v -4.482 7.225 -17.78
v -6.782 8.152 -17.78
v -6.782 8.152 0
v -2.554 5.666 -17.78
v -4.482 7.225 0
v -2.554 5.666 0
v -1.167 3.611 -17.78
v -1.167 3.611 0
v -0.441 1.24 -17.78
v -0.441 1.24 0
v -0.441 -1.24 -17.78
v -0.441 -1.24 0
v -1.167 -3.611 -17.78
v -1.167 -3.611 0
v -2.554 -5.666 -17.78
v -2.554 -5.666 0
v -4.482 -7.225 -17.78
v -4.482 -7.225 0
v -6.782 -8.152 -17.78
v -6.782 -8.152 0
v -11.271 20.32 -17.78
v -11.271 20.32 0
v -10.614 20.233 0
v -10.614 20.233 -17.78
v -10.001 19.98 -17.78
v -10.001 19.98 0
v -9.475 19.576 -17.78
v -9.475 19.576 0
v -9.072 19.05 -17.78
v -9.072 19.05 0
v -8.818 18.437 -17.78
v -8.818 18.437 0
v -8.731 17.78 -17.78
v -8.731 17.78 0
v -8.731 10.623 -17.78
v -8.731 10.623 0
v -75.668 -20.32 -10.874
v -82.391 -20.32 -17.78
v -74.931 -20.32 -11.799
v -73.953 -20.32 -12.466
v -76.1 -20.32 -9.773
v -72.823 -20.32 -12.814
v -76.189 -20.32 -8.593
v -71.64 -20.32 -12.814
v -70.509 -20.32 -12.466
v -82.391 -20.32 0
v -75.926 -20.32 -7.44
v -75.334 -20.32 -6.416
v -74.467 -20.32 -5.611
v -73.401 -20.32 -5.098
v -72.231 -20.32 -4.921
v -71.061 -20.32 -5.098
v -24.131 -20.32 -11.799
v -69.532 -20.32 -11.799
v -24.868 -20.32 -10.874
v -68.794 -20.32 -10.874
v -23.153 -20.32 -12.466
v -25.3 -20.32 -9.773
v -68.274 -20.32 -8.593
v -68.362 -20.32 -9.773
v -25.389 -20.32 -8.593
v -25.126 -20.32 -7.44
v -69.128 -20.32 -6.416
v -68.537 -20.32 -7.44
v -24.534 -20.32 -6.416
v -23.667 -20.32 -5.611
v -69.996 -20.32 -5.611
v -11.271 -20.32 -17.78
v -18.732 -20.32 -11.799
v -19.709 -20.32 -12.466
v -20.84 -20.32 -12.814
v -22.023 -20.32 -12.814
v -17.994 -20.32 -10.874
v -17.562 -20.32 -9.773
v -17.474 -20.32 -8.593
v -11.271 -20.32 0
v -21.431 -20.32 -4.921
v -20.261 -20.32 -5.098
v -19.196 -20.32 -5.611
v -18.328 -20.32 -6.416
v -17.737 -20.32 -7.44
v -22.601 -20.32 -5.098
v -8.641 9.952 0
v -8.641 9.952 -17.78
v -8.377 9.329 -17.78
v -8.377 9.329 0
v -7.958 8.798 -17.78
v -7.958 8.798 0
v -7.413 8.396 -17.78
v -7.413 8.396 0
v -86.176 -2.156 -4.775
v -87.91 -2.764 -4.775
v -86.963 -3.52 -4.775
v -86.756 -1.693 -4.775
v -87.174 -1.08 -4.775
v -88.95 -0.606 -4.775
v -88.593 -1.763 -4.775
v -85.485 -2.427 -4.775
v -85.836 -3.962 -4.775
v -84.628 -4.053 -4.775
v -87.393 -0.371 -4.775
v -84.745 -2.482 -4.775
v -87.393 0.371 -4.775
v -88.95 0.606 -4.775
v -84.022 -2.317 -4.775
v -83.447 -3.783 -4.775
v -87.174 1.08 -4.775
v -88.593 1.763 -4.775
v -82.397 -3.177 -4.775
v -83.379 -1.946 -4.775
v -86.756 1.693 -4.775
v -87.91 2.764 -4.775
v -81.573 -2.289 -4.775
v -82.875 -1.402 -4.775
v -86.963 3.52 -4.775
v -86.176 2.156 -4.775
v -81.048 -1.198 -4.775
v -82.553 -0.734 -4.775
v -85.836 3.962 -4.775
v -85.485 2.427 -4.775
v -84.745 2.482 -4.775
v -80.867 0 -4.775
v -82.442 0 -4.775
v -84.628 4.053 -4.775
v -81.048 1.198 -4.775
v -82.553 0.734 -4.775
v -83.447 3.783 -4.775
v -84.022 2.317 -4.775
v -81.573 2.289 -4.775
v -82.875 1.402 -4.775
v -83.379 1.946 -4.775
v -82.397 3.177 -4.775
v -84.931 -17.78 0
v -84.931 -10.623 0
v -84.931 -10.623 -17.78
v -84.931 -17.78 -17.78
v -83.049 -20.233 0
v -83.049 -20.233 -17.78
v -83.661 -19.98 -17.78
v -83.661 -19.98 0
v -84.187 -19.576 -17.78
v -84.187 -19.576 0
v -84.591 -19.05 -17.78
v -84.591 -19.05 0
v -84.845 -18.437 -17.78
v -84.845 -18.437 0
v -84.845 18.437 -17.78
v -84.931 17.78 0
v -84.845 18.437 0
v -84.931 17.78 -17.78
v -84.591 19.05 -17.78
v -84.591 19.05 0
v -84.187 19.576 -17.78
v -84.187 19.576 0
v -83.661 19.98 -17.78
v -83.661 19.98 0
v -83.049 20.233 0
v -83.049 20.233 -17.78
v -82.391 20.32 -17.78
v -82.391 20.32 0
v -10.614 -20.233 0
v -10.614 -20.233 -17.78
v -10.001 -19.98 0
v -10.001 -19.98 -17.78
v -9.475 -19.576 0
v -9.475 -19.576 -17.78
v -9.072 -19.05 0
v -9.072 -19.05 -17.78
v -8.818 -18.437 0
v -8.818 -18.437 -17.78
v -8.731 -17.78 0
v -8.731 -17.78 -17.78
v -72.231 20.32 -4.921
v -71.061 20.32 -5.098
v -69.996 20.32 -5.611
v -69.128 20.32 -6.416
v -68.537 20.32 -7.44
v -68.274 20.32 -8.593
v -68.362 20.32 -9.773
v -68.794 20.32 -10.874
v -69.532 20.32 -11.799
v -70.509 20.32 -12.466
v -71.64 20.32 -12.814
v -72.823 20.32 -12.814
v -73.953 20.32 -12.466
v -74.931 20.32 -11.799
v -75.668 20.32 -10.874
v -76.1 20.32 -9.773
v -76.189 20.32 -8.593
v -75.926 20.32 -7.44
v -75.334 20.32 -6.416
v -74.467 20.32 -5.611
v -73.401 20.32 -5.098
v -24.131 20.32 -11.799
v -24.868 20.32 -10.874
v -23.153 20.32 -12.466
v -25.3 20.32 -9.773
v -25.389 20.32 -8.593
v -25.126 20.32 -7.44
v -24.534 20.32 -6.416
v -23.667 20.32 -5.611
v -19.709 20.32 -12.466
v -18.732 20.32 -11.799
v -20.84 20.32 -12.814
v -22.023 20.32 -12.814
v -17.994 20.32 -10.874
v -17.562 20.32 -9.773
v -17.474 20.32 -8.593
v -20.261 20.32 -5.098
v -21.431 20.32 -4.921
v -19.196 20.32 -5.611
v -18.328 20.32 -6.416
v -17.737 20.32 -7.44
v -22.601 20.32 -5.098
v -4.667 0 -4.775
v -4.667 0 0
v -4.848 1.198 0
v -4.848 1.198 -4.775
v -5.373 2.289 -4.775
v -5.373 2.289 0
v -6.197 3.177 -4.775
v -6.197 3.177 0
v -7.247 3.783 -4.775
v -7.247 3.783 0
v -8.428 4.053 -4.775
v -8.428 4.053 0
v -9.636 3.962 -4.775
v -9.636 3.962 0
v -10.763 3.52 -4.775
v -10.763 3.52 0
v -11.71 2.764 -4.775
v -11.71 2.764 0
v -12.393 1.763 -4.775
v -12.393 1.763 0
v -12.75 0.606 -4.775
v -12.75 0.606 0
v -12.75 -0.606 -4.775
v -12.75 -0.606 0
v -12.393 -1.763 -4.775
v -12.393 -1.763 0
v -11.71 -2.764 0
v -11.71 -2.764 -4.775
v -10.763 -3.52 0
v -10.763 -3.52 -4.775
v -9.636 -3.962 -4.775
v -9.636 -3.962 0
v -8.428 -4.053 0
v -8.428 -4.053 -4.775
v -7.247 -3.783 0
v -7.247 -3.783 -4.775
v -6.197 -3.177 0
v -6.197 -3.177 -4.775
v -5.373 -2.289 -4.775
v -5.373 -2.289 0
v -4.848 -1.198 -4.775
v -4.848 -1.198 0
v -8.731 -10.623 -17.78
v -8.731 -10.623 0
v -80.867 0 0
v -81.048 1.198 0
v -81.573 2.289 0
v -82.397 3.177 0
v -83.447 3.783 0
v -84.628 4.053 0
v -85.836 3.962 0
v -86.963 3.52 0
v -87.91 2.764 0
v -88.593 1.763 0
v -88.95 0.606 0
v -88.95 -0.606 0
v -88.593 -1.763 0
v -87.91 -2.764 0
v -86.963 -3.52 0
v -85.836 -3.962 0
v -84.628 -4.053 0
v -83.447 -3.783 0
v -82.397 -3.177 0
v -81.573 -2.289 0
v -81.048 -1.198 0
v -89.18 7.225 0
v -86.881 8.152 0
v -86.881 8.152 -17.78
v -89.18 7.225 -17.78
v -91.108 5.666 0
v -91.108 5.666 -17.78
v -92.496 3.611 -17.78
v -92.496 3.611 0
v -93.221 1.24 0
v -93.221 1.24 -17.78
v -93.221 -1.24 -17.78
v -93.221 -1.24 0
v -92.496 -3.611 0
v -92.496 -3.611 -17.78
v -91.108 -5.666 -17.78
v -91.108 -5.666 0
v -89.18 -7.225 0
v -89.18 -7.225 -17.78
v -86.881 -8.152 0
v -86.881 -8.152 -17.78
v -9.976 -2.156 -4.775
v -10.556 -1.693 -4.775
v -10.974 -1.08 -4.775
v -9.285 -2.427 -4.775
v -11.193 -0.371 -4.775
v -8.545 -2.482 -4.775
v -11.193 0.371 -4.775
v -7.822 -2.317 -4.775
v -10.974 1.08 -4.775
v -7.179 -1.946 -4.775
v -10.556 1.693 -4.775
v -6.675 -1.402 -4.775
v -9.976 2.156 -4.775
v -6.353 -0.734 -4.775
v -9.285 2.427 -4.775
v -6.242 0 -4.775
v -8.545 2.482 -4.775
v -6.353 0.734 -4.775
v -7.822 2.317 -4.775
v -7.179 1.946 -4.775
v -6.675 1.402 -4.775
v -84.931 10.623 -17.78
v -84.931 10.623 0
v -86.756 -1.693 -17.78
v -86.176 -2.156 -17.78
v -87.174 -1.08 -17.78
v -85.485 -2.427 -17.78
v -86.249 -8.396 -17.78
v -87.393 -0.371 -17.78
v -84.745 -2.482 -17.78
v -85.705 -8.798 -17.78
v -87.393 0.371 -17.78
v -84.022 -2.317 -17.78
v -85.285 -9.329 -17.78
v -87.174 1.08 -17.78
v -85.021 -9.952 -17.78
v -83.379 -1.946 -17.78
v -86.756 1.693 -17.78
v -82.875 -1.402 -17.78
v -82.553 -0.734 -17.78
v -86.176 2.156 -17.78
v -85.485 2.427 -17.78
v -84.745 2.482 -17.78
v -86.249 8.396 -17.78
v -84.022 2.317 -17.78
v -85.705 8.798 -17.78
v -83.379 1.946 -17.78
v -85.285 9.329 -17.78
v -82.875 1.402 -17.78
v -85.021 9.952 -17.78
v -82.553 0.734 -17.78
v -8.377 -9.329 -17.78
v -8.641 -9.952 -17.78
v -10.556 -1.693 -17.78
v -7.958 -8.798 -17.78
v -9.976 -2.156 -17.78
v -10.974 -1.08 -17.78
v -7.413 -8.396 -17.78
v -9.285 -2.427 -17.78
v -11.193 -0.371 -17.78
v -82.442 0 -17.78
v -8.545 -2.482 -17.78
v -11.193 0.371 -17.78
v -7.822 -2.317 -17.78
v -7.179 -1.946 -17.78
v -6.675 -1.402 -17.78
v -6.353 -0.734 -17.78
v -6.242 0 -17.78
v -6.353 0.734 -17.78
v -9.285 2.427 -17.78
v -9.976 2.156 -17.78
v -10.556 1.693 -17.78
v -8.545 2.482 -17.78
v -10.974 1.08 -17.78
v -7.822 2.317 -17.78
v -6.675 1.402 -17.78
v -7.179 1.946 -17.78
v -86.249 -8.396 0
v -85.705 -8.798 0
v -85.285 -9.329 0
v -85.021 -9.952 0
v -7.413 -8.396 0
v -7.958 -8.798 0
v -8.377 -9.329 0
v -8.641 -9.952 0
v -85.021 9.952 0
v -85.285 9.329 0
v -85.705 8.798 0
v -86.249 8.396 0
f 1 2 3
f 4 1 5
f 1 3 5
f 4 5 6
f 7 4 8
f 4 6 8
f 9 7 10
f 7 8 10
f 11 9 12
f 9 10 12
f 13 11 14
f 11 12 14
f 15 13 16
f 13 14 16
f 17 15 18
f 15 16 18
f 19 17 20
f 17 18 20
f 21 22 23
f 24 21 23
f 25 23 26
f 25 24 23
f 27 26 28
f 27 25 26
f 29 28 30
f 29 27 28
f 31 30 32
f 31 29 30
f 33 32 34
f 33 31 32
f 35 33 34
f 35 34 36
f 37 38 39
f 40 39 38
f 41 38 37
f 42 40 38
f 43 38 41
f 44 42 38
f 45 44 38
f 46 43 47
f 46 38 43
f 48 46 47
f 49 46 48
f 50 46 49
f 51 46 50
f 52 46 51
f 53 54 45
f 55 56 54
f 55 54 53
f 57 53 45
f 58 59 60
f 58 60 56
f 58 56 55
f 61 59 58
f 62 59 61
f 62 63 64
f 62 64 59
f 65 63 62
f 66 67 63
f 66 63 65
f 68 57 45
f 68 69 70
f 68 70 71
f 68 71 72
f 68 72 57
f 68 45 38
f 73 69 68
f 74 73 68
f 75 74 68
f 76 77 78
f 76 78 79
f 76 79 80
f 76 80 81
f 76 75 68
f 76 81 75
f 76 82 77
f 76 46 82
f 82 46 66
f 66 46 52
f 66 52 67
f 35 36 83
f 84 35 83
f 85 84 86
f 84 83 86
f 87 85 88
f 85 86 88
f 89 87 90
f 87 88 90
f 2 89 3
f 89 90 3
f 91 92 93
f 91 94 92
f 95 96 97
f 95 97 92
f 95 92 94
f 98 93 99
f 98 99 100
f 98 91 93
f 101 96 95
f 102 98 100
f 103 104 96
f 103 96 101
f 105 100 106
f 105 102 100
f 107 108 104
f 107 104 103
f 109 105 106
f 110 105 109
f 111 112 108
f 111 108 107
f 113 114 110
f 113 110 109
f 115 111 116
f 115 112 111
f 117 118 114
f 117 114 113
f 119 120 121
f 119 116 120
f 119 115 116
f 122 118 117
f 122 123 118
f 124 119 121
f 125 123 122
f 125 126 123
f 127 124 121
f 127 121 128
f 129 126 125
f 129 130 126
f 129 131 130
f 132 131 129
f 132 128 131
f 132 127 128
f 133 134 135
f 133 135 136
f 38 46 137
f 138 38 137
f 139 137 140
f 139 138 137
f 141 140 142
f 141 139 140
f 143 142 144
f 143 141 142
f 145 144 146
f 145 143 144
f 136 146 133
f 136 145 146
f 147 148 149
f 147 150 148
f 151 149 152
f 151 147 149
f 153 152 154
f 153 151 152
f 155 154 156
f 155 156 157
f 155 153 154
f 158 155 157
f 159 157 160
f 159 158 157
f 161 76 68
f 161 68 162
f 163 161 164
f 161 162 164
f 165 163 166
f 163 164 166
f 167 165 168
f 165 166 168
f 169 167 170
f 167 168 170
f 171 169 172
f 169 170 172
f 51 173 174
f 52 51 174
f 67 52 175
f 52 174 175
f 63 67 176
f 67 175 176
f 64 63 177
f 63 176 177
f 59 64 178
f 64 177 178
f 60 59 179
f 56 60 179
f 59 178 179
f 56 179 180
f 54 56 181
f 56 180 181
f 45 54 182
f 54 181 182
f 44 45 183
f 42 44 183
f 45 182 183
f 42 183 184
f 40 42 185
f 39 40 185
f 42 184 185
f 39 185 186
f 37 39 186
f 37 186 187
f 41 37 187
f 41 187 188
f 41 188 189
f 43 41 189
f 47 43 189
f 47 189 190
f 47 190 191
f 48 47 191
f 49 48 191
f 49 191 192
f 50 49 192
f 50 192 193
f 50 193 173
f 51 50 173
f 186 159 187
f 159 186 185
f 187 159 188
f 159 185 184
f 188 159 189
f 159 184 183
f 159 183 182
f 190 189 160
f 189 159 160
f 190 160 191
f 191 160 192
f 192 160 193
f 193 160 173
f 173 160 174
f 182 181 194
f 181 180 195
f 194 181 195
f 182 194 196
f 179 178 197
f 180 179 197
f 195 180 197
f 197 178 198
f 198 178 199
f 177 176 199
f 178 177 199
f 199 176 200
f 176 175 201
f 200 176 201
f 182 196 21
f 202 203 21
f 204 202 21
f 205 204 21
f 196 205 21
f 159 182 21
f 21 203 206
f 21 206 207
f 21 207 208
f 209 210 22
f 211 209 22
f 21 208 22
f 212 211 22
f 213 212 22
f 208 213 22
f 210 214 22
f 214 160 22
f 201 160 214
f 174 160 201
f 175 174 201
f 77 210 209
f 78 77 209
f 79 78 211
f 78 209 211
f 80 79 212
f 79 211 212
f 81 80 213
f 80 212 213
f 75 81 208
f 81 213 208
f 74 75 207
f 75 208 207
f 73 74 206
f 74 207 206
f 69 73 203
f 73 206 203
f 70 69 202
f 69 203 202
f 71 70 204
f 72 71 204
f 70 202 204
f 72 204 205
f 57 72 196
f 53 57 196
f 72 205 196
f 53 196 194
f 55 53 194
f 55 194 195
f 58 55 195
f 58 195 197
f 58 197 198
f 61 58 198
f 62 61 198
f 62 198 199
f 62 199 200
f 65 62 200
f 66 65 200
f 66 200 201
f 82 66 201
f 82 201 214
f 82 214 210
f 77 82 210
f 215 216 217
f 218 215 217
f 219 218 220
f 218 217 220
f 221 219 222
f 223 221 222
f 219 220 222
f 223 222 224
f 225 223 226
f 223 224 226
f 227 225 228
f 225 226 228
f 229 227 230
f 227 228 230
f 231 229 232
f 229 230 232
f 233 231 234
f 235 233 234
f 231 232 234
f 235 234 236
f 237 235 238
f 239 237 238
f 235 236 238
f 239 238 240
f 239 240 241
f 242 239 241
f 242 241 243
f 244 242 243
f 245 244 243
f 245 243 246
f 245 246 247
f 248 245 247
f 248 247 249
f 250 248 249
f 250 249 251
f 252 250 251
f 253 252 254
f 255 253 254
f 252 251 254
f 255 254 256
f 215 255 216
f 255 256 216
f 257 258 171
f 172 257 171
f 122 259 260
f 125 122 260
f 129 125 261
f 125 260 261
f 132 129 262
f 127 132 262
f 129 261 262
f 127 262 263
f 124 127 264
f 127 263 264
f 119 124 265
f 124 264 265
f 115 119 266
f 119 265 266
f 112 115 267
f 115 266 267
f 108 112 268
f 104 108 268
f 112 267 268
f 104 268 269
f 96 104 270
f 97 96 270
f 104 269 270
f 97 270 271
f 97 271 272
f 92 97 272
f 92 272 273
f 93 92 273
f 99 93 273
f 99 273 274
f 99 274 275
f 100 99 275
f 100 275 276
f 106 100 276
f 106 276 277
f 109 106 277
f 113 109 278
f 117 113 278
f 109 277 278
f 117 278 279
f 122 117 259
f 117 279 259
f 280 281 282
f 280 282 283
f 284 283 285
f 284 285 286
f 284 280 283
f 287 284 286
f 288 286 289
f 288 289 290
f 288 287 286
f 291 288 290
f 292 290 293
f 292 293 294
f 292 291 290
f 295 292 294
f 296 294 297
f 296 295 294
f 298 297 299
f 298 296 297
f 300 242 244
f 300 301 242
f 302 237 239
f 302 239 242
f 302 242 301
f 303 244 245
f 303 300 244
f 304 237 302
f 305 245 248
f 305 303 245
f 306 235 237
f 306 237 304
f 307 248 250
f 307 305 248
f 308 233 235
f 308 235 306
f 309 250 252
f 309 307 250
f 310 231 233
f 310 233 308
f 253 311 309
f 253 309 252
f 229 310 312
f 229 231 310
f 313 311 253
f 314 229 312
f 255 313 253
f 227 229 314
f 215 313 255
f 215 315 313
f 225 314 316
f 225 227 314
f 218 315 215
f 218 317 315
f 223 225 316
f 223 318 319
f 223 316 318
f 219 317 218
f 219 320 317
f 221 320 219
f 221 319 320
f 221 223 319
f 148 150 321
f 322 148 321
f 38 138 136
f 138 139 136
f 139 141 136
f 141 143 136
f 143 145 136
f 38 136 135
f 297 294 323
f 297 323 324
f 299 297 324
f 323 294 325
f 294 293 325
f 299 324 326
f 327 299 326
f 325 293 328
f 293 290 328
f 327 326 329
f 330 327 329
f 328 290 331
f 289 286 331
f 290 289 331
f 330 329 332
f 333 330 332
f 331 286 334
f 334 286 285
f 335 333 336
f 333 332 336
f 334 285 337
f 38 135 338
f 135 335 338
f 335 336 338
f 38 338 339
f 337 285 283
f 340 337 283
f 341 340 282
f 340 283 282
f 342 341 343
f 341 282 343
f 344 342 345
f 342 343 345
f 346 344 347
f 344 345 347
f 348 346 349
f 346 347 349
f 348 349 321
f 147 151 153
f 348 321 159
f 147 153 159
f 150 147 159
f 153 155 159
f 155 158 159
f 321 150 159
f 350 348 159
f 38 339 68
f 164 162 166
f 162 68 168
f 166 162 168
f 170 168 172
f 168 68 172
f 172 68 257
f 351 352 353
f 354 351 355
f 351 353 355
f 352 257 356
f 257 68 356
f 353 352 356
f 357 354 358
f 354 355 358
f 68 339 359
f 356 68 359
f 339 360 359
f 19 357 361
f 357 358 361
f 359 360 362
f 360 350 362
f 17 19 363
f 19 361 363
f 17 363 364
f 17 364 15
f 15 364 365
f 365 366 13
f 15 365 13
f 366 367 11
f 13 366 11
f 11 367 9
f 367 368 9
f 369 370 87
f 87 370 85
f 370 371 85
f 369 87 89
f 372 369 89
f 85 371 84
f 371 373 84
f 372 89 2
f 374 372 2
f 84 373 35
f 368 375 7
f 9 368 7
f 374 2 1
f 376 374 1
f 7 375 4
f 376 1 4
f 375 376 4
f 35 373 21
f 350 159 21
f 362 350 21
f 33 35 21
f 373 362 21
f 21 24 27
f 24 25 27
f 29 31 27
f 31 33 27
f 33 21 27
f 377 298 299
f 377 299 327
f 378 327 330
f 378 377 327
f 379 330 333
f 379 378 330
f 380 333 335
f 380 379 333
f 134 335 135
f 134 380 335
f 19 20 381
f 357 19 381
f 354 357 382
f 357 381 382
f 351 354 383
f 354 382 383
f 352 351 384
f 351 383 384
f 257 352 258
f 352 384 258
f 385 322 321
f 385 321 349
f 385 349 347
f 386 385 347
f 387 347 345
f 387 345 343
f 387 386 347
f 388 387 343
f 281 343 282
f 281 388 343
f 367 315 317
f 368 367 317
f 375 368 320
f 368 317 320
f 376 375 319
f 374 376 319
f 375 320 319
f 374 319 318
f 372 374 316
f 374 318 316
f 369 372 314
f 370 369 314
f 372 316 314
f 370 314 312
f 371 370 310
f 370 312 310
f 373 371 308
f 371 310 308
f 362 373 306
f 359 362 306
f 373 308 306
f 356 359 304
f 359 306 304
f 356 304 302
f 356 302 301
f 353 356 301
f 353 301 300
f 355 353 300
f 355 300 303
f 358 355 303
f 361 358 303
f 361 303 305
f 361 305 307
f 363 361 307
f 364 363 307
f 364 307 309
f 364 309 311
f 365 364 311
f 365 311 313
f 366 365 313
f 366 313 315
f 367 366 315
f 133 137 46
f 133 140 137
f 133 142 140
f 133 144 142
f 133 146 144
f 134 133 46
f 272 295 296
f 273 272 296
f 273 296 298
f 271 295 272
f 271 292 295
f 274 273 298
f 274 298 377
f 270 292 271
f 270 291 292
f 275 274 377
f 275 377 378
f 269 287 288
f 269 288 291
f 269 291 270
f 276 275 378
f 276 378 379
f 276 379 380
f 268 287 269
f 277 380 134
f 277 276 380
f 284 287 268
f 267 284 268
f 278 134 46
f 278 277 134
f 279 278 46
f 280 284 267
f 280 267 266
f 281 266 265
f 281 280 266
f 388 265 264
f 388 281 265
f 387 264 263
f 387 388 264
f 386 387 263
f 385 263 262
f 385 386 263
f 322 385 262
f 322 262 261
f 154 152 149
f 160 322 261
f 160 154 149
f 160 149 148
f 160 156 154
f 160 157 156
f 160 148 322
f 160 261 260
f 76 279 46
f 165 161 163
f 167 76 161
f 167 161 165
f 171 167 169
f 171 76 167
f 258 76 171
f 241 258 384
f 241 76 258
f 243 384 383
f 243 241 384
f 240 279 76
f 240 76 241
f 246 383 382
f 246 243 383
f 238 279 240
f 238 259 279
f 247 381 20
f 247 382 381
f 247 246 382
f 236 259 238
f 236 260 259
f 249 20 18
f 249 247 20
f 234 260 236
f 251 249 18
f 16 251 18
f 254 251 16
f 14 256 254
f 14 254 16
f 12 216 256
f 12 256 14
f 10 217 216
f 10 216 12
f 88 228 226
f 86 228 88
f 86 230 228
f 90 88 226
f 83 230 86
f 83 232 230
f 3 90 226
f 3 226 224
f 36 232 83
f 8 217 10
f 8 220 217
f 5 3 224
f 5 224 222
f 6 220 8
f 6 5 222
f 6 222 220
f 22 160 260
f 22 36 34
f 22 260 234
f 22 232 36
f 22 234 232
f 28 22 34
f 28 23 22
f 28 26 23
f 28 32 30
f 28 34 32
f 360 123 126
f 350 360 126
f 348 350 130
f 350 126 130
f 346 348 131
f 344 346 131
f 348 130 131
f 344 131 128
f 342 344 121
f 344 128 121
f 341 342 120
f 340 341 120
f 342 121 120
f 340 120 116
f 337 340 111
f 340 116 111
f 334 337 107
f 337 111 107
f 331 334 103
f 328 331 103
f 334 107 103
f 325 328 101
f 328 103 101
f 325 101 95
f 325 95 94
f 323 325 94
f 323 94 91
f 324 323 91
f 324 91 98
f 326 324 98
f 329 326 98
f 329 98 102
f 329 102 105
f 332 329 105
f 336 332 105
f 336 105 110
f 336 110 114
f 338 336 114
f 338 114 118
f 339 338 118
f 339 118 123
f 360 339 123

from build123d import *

# Parameters (mm, degrees)
SKETCH1_W           = 93.6625
SKETCH1_H           = 40.64
SKETCH1_R           = 2.4892
BOSS_EXTRUDE1_DEPTH = 17.78
SKETCH6_R           = 3.96875
CUT_EXTRUDE4_DEPTH  = 104.635910312
CUT_EXTRUDE3_DEPTH  = 17.78
FILLET1_R           = 2.54
SKETCH3_R           = 4.064
CUT_EXTRUDE5_DEPTH  = 4.7752


with BuildPart() as part:
    # Sketch1 → Boss-Extrude1 (new body)
    with BuildSketch(Plane.XY):
        with Locations((-46.83125, 0)):
            Rectangle(SKETCH1_W, SKETCH1_H)
        with Locations((-84.93125, 0)):
            Circle(SKETCH1_R, mode=Mode.SUBTRACT)
        with Locations((-8.73125, 0)):
            Circle(SKETCH1_R, mode=Mode.SUBTRACT)
    extrude(amount=-BOSS_EXTRUDE1_DEPTH)

    # Sketch6 → Cut-Extrude4 (cut, through all)
    with BuildSketch(Plane(origin=(0, 20.32, 0), x_dir=(1, 0, 0), z_dir=(0, 1, 0))):
        with Locations(Location((-72.23125, 8.89, 0), (0, 0, 270))):
            Circle(SKETCH6_R)
        with Locations(Location((-21.43125, 8.89, 0), (0, 0, 270))):
            Circle(SKETCH6_R)
    extrude(amount=-CUT_EXTRUDE4_DEPTH, mode=Mode.SUBTRACT)

    # Sketch5 → Cut-Extrude3 (cut)
    with BuildSketch(Plane.XY):
        with BuildLine():
            Line((-93.6625, -20.32), (-93.6625, 20.32))
            Line((-93.6625, 20.32), (-84.93125, 20.32))
            Line((-84.93125, 20.32), (-84.93125, 10.622546022))
            ThreePointArc((-84.93125, 10.622546022), (-85.477262526, 9.049137635), (-86.880552326, 8.152186482))
            ThreePointArc((-86.880552326, 8.152186482), (-93.31325, 0), (-86.880552326, -8.152186482))
            ThreePointArc((-86.880552326, -8.152186482), (-85.477262526, -9.049137635), (-84.93125, -10.622546022))
            Line((-84.93125, -10.622546022), (-84.93125, -20.32))
            Line((-84.93125, -20.32), (-93.6625, -20.32))
        make_face()
        with BuildLine():
            Line((0, -20.32), (0, 20.32))
            Line((0, 20.32), (-8.73125, 20.32))
            Line((-8.73125, 20.32), (-8.73125, 10.622546022))
            ThreePointArc((-8.73125, 10.622546022), (-8.185237474, 9.049137635), (-6.781947674, 8.152186482))
            ThreePointArc((-6.781947674, 8.152186482), (-0.34925, 0), (-6.781947674, -8.152186482))
            ThreePointArc((-6.781947674, -8.152186482), (-8.185237474, -9.049137635), (-8.73125, -10.622546022))
            Line((-8.73125, -10.622546022), (-8.73125, -20.32))
            Line((-8.73125, -20.32), (0, -20.32))
        make_face()
    extrude(amount=-CUT_EXTRUDE3_DEPTH, mode=Mode.SUBTRACT)

    # Fillet1
    fillet1_edges = [part.edges().sort_by_distance(p)[0] for p in [
        (-84.93125, 20.32, -8.89),
        (-84.93125, -20.32, -8.89),
        (-8.73125, 20.32, -8.89),
        (-8.73125, -20.32, -8.89),
    ]]
    fillet(fillet1_edges, radius=FILLET1_R)

    # Sketch3 → Cut-Extrude5 (cut)
    with BuildSketch(Plane.XY):
        with Locations((-84.93125, 0)):
            Circle(SKETCH3_R)
        with Locations((-8.73125, 0)):
            Circle(SKETCH3_R)
    extrude(amount=-CUT_EXTRUDE5_DEPTH, mode=Mode.SUBTRACT)


solid = part.part
